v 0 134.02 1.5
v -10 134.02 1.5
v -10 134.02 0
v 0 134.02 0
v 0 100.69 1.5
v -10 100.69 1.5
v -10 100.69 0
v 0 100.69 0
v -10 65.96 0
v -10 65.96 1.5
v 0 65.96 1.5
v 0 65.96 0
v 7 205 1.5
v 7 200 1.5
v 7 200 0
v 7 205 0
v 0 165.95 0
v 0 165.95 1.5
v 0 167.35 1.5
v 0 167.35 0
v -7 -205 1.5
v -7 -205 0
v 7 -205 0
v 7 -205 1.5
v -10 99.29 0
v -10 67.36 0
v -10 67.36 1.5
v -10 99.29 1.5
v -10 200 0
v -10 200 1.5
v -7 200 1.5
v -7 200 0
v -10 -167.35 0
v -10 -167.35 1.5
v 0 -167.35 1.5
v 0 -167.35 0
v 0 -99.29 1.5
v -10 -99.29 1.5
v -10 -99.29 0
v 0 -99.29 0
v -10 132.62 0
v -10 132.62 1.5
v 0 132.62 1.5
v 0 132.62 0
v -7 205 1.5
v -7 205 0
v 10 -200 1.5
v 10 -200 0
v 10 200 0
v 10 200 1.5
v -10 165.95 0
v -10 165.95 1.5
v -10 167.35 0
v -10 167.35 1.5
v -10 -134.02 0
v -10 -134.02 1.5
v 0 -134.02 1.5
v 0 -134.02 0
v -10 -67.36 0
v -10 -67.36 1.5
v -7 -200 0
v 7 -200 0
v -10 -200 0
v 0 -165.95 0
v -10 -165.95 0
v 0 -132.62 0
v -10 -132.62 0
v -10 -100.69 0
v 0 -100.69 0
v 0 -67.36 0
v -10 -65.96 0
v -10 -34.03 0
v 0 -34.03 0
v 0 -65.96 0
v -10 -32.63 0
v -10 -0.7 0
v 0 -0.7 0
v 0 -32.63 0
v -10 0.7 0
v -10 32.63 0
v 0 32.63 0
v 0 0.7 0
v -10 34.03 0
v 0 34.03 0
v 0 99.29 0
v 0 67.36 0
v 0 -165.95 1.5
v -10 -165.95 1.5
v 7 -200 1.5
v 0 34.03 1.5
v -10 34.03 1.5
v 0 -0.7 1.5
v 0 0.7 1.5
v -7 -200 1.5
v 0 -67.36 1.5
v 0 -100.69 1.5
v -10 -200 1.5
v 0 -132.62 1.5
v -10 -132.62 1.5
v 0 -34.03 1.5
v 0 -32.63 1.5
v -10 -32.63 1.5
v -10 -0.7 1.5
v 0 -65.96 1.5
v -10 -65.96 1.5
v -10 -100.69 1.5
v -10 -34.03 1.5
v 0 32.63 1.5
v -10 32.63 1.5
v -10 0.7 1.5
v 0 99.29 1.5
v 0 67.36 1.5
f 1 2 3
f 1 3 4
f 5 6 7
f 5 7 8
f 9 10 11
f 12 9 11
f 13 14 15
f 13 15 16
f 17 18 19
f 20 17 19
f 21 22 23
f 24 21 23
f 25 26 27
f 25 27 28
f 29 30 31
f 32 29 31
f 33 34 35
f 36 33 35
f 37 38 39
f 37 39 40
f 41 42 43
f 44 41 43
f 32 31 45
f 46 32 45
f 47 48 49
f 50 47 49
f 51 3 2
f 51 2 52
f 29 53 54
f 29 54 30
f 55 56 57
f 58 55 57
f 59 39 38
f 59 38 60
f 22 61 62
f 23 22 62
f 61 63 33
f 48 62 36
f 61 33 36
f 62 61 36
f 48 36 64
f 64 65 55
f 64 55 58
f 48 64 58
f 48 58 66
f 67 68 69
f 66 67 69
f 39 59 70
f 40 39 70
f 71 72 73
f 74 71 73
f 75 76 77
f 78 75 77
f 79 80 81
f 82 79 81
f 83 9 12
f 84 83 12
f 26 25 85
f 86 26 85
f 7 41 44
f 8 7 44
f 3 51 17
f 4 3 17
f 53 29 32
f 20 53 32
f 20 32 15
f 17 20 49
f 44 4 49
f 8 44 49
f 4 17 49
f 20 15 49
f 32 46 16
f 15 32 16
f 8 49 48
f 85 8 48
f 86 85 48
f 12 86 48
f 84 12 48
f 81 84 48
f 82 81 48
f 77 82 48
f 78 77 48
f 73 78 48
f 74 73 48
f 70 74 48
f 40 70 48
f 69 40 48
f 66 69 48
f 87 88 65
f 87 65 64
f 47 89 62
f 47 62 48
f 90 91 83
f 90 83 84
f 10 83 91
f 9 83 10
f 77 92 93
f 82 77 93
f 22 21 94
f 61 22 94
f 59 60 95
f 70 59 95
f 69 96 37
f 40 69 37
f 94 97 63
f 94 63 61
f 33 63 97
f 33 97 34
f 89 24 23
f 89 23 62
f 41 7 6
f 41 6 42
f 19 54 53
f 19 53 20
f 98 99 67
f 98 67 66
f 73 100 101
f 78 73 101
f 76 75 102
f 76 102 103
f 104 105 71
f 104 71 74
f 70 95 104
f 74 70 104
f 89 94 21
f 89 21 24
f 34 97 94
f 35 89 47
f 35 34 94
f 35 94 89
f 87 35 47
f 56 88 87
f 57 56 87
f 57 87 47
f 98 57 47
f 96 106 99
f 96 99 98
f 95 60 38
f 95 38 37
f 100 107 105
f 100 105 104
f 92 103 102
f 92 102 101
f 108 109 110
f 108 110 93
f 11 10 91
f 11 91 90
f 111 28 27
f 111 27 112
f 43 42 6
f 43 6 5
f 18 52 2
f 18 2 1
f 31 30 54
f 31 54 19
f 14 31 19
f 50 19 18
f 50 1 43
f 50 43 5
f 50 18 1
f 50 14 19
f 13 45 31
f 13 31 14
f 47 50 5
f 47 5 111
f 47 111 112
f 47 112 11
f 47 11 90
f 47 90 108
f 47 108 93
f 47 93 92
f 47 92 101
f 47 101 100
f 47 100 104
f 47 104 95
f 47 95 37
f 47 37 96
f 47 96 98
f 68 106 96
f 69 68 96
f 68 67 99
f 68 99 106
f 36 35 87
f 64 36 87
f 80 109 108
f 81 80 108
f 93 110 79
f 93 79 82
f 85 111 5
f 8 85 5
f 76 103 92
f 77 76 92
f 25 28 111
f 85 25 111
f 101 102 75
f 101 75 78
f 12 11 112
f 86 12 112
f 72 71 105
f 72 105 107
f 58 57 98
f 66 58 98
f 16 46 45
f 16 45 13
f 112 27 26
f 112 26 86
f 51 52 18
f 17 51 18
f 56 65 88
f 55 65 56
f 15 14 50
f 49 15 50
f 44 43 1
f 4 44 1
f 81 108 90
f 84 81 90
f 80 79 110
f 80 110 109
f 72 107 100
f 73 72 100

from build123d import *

# Parameters (mm, degrees)
SKETCH_1_W                 = 20
SKETCH_1_H                 = 410
EXTRUDE_1_DEPTH            = 1.5
CUT_EXTRUDE_1_REACH        = 3.5
SKETCH_2_W                 = 3
SKETCH_2_H                 = 5
SKETCH_3_W                 = 20
SKETCH_3_H                 = 1.4
CUT_EXTRUDE_2_DEPTH        = 1.5
PATTERN_LINEAR_1_COUNT     = 6
PATTERN_LINEAR_1_PITCH     = 33.33
PATTERN_LINEAR_1_COL_COUNT = 6
PATTERN_LINEAR_1_COL_PITCH = 33.33


with BuildPart() as part:
    # 草图1 → 凸台-拉伸1 (new body)
    with BuildSketch(Plane.XY):
        Rectangle(SKETCH_1_W, SKETCH_1_H)
    extrude(amount=EXTRUDE_1_DEPTH)

    # 草图2 → 切除-拉伸1 (cut, up to next)
    with BuildSketch(Plane.XY.offset(1.5), mode=Mode.PRIVATE) as cut_extrude_1_sk1:
        with Locations((-8.5, 202.5)):
            Rectangle(SKETCH_2_W, SKETCH_2_H)
    cut_extrude_1_tool1 = extrude(cut_extrude_1_sk1.sketch, amount=-CUT_EXTRUDE_1_REACH, mode=Mode.PRIVATE) & part.part
    add(cut_extrude_1_tool1.solids().sort_by_distance((-8.5, 202.5, 1.5))[0], mode=Mode.SUBTRACT)
    # 草图2 → 切除-拉伸1 (cut, up to next)
    with BuildSketch(Plane.XY.offset(1.5), mode=Mode.PRIVATE) as cut_extrude_1_sk2:
        with Locations((8.5, 202.5)):
            Rectangle(SKETCH_2_W, SKETCH_2_H)
    cut_extrude_1_tool2 = extrude(cut_extrude_1_sk2.sketch, amount=-CUT_EXTRUDE_1_REACH, mode=Mode.PRIVATE) & part.part
    add(cut_extrude_1_tool2.solids().sort_by_distance((8.5, 202.5, 1.5))[0], mode=Mode.SUBTRACT)
    # 草图2 → 切除-拉伸1 (cut, up to next)
    with BuildSketch(Plane.XY.offset(1.5), mode=Mode.PRIVATE) as cut_extrude_1_sk3:
        with Locations((-8.5, -202.5)):
            Rectangle(SKETCH_2_W, SKETCH_2_H)
    cut_extrude_1_tool3 = extrude(cut_extrude_1_sk3.sketch, amount=-CUT_EXTRUDE_1_REACH, mode=Mode.PRIVATE) & part.part
    add(cut_extrude_1_tool3.solids().sort_by_distance((-8.5, -202.5, 1.5))[0], mode=Mode.SUBTRACT)
    # 草图2 → 切除-拉伸1 (cut, up to next)
    with BuildSketch(Plane.XY.offset(1.5), mode=Mode.PRIVATE) as cut_extrude_1_sk4:
        with Locations((8.5, -202.5)):
            Rectangle(SKETCH_2_W, SKETCH_2_H)
    cut_extrude_1_tool4 = extrude(cut_extrude_1_sk4.sketch, amount=-CUT_EXTRUDE_1_REACH, mode=Mode.PRIVATE) & part.part
    add(cut_extrude_1_tool4.solids().sort_by_distance((8.5, -202.5, 1.5))[0], mode=Mode.SUBTRACT)

    # 草图3 → 切除-拉伸2 (cut)
    with BuildSketch(Plane.XY.offset(1.5)):
        with Locations((-10, 0)):
            Rectangle(SKETCH_3_W, SKETCH_3_H)
    cut_extrude_2 = extrude(amount=-CUT_EXTRUDE_2_DEPTH, mode=Mode.SUBTRACT)

    # 阵列(线性)1: 切除-拉伸2 ×6
    with Locations(*[(0, i * PATTERN_LINEAR_1_PITCH, 0) for i in range(1, PATTERN_LINEAR_1_COUNT)]):
        add(cut_extrude_2, mode=Mode.SUBTRACT)

    # 阵列(线性)1 col: 切除-拉伸2 ×6
    with Locations(*[(0, -i * PATTERN_LINEAR_1_COL_PITCH, 0) for i in range(1, PATTERN_LINEAR_1_COL_COUNT)]):
        add(cut_extrude_2, mode=Mode.SUBTRACT)


solid = part.part
